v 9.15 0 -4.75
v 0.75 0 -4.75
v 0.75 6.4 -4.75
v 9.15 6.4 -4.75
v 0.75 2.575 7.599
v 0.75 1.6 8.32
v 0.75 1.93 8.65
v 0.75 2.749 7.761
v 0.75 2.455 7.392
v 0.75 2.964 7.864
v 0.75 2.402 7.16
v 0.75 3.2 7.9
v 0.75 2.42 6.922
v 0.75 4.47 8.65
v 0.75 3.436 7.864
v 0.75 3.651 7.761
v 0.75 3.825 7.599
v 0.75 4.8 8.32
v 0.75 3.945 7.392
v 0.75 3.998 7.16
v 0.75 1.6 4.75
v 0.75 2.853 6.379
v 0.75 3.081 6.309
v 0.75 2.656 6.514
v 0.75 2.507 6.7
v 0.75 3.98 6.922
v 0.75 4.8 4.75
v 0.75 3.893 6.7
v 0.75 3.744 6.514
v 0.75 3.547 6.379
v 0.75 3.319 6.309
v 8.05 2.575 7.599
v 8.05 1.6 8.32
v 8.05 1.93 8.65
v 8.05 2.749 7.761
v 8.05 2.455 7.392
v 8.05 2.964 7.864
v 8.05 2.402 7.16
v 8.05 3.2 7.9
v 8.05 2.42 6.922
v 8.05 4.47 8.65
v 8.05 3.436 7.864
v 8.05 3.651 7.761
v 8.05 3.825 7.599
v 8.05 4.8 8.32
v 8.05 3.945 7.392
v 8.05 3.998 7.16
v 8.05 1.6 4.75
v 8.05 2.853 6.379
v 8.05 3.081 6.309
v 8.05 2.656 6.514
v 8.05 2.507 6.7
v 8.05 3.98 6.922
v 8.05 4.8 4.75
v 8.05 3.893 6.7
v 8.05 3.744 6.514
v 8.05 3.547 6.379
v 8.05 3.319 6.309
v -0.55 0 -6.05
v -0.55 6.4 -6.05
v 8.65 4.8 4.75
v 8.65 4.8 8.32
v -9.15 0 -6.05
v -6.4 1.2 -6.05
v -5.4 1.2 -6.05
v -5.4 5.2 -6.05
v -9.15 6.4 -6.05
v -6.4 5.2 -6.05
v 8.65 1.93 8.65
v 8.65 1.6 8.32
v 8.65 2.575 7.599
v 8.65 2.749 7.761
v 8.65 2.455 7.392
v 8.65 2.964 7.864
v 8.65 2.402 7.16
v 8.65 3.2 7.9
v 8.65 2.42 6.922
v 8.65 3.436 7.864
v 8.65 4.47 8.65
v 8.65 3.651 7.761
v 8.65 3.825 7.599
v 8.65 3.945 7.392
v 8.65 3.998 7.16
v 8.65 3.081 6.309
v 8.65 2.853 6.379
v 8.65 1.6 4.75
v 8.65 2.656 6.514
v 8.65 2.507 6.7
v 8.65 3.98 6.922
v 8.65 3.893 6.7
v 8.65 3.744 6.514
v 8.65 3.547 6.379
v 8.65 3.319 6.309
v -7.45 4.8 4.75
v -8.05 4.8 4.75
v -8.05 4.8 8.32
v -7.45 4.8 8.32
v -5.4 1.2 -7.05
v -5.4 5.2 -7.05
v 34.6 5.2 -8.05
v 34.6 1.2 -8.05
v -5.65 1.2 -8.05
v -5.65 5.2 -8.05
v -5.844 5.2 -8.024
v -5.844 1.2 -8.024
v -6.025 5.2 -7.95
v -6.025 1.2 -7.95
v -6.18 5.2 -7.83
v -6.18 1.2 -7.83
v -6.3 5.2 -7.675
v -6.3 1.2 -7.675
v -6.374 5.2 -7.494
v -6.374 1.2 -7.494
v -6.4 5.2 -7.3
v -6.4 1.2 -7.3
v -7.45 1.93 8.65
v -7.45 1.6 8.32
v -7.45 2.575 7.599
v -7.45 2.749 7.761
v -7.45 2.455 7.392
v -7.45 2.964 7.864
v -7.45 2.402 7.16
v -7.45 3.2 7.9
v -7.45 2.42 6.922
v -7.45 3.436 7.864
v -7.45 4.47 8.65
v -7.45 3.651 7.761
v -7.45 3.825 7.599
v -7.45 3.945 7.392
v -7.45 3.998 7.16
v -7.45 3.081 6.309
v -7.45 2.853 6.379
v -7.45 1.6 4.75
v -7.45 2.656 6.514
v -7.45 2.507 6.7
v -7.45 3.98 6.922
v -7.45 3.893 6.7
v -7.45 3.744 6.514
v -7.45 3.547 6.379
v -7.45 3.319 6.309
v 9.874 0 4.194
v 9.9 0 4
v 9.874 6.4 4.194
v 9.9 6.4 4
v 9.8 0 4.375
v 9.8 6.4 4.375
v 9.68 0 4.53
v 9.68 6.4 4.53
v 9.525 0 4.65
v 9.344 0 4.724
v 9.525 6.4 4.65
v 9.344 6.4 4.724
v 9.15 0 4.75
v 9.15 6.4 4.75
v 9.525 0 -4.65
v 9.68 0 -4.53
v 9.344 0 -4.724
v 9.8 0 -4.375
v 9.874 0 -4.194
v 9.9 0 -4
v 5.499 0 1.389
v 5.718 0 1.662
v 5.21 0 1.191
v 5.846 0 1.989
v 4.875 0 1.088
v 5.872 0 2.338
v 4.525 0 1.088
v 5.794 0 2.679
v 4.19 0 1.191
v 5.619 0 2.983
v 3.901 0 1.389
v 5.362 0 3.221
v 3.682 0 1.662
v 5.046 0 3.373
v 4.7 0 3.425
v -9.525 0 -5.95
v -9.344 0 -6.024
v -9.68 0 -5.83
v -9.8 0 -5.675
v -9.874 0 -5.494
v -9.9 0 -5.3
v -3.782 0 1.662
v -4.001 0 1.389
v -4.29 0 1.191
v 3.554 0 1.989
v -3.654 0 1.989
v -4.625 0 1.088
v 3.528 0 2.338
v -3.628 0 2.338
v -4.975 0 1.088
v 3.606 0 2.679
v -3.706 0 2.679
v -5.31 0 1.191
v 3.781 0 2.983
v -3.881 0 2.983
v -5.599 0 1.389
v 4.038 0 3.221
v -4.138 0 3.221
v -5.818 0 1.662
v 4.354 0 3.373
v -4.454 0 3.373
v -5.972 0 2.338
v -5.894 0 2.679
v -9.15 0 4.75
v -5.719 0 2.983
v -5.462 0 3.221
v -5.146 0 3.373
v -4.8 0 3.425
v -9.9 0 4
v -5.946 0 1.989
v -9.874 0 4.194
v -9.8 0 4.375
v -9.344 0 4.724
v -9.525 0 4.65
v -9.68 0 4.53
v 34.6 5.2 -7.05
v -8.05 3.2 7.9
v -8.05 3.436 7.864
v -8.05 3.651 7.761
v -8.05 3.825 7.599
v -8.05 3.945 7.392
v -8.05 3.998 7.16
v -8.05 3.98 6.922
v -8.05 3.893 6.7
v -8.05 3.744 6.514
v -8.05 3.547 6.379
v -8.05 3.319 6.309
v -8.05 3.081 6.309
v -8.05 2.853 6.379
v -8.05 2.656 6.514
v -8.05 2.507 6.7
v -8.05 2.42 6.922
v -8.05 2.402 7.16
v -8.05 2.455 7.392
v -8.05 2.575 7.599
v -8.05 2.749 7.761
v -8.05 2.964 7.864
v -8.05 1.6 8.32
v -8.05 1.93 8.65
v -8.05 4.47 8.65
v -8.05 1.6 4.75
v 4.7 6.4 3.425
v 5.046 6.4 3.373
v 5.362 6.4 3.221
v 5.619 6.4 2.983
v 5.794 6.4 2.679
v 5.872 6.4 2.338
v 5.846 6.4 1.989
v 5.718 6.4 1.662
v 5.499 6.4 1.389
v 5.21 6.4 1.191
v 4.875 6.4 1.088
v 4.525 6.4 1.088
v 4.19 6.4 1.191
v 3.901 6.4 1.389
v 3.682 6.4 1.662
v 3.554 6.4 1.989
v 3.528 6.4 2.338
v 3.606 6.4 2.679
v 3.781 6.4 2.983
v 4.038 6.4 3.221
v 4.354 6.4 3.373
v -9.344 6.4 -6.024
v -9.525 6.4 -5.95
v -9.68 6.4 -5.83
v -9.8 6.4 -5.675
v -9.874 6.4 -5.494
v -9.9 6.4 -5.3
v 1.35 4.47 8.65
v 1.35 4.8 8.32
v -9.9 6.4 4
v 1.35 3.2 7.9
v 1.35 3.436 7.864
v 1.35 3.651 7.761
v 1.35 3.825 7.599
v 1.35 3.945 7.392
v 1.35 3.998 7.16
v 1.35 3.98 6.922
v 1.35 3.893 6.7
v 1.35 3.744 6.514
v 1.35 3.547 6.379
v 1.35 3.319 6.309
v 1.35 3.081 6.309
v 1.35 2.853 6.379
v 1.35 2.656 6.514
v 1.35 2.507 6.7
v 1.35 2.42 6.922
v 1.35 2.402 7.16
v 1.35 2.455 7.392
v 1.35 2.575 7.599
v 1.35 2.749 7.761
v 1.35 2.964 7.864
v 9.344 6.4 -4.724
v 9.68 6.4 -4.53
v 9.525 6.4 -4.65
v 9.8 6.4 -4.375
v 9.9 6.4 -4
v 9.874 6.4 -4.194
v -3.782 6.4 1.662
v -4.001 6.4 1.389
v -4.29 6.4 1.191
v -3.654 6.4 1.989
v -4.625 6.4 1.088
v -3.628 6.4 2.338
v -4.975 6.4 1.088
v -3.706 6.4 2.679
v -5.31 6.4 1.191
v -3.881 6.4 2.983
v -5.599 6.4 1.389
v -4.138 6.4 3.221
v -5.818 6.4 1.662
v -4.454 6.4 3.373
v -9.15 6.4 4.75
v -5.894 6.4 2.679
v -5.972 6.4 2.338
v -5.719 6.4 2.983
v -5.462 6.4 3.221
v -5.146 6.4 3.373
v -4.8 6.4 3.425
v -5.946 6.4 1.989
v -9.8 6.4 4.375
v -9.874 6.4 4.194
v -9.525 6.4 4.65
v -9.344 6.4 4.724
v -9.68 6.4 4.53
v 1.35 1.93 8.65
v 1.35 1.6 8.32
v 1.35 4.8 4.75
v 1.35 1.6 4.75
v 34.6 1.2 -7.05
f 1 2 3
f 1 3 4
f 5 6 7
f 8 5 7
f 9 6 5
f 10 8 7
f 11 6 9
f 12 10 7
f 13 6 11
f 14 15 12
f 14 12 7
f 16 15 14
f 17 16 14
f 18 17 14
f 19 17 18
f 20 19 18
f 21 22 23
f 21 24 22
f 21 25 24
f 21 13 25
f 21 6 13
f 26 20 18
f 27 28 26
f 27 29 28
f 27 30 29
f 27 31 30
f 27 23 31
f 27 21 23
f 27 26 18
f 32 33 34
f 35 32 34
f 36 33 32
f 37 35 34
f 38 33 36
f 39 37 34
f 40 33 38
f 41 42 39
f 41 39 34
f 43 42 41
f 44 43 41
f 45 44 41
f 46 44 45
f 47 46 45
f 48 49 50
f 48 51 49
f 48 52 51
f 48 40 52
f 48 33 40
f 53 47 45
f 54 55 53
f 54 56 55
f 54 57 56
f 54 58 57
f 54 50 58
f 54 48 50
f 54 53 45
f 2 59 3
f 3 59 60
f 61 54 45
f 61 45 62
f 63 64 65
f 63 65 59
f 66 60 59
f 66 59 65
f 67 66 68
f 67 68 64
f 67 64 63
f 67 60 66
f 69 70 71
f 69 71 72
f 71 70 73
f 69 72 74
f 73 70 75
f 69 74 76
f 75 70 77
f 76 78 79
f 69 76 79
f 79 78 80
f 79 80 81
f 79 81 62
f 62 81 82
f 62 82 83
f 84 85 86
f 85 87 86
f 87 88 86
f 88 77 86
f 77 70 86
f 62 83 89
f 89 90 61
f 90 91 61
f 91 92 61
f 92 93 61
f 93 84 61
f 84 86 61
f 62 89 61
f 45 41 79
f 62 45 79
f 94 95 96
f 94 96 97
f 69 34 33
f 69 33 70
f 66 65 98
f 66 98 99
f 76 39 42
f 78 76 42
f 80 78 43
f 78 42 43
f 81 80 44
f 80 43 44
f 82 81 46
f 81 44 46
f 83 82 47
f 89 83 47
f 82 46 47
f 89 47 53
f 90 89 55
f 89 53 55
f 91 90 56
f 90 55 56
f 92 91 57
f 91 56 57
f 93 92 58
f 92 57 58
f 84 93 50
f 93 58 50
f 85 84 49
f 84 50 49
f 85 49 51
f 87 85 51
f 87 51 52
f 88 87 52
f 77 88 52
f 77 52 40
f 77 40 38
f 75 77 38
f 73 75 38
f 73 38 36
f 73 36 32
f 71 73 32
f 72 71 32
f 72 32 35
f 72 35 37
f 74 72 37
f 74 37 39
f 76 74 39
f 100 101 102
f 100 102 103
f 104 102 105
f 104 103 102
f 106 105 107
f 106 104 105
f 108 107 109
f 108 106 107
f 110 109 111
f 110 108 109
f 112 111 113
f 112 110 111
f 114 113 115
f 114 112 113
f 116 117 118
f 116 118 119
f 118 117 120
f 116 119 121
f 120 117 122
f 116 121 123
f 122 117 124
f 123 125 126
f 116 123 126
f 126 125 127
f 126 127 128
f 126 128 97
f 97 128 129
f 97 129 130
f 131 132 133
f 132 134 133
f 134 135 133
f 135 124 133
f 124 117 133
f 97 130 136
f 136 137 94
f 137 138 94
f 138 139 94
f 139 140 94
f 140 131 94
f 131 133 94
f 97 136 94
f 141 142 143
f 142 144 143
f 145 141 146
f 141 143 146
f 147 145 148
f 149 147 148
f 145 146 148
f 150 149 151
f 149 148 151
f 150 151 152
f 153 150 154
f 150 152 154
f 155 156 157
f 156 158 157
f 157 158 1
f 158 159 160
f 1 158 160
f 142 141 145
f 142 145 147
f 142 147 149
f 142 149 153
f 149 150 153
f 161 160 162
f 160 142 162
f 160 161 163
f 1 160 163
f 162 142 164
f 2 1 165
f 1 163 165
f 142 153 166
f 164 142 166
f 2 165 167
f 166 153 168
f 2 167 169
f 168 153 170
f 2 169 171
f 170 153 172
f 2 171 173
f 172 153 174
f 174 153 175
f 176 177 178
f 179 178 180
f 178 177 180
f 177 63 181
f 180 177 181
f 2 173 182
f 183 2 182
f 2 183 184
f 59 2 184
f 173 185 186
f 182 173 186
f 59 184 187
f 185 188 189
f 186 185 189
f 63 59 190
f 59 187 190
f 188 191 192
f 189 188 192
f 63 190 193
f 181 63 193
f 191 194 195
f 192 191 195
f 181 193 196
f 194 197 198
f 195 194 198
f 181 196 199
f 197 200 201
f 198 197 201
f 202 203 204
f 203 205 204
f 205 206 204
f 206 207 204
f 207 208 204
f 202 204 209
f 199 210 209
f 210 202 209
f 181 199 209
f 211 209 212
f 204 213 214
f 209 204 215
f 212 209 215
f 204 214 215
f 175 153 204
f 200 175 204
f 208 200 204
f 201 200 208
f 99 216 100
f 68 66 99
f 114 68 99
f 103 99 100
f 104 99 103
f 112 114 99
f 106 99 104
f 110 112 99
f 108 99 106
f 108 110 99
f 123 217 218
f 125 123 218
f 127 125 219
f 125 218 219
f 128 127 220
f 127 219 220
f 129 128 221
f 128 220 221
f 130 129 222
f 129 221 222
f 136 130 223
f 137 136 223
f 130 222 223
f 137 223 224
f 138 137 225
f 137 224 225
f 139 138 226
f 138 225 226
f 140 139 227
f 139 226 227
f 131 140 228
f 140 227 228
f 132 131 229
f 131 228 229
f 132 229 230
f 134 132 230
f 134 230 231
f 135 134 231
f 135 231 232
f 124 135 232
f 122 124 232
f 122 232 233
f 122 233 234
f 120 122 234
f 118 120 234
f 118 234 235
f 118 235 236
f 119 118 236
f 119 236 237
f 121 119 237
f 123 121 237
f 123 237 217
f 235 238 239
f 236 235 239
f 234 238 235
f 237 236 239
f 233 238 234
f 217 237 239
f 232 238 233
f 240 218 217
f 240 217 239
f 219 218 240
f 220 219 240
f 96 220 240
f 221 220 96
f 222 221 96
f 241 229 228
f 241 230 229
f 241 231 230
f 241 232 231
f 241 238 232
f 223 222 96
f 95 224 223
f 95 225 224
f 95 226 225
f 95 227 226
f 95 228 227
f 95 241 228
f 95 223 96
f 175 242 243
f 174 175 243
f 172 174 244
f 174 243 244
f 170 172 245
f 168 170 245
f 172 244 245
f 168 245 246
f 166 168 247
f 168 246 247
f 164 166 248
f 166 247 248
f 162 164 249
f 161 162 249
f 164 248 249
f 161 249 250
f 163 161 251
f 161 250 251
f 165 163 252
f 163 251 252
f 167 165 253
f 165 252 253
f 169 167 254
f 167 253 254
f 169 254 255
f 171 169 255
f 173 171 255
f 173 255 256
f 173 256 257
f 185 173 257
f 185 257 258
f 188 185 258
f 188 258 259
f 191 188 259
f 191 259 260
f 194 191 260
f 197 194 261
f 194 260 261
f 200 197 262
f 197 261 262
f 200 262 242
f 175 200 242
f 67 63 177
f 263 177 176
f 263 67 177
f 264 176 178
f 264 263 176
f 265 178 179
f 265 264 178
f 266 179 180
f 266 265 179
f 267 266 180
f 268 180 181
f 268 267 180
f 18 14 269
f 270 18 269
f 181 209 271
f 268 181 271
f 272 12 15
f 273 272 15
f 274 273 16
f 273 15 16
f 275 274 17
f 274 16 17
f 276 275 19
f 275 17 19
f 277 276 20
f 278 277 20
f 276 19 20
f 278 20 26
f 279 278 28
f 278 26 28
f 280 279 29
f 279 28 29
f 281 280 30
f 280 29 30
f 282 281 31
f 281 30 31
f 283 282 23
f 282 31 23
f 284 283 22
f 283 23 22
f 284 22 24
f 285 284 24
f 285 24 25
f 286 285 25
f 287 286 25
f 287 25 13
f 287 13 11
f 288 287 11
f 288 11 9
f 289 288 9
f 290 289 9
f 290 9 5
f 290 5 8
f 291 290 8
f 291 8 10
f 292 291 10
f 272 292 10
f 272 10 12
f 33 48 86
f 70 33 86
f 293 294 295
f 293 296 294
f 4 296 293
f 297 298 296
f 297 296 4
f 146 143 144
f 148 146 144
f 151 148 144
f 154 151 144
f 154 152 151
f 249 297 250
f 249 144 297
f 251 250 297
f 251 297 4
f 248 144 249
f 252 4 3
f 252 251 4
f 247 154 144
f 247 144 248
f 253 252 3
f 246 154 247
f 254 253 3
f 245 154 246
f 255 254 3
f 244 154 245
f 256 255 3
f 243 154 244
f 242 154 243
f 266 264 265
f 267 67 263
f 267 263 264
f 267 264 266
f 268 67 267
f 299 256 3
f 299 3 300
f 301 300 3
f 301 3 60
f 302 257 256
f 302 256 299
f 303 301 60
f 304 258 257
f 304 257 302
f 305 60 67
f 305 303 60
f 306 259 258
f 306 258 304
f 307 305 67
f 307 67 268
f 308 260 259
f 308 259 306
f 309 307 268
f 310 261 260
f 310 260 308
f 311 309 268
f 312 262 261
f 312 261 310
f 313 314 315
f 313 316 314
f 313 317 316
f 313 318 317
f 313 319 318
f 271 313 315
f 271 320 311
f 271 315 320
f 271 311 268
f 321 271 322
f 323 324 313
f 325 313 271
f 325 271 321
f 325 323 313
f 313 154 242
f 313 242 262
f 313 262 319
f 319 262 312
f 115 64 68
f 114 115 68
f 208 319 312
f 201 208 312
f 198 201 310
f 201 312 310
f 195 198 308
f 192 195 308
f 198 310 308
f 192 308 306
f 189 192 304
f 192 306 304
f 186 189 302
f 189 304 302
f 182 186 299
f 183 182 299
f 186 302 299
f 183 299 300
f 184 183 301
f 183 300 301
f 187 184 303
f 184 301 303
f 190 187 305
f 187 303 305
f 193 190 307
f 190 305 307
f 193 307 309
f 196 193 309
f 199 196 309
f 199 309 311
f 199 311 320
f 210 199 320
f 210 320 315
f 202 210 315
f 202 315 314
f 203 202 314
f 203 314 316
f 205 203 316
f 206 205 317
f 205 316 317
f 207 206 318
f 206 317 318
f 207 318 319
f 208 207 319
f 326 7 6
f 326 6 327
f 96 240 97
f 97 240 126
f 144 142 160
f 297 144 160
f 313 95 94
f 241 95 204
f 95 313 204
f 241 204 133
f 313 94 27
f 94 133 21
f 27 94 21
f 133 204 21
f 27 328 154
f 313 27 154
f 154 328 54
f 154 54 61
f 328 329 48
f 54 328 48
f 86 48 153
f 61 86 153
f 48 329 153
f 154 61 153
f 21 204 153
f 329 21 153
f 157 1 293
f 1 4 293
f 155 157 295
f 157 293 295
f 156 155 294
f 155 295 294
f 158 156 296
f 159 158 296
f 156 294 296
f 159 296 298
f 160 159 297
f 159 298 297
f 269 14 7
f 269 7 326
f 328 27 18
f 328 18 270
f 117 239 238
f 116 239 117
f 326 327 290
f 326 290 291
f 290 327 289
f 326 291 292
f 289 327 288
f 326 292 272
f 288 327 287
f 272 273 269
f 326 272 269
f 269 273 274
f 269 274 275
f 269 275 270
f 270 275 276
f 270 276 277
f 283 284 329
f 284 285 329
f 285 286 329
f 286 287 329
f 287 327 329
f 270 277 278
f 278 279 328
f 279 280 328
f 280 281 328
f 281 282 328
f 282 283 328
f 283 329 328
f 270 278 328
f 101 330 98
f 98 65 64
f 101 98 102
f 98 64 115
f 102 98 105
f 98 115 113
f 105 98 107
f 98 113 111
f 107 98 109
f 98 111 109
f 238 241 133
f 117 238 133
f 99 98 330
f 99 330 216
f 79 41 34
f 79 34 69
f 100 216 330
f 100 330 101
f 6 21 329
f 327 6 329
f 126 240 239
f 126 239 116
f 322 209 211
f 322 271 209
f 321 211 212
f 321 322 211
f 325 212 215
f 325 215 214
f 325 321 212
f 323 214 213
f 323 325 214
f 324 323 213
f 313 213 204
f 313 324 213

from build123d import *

# Parameters (mm, degrees)
SKETCH1_W           = 19.8
SKETCH1_H           = 9.5
BOSS_EXTRUDE1_DEPTH = 6.4
SKETCH2_W           = 10.65
SKETCH2_H           = 6.4
BOSS_EXTRUDE2_DEPTH = 1.3
CHAMFER3_SIZE       = 1.3
FILLET1_R           = 0.75
SKETCH3_W           = 1
SKETCH3_H           = 4
BOSS_EXTRUDE3_DEPTH = 2
SKETCH4_W           = 1
SKETCH4_H           = 4
BOSS_EXTRUDE4_DEPTH = 40
FILLET2_R           = 0.75
SKETCH5_R           = 1.175
CUT_EXTRUDE1_DEPTH  = 6.4
SKETCH6_W           = 0.6
SKETCH6_H           = 3.2
BOSS_EXTRUDE5_DEPTH = 3.9
SKETCH8_R           = 0.8
CUT_EXTRUDE2_DEPTH  = 16.7
CHAMFER4_SIZE       = 0.33


with BuildPart() as part:
    # Sketch1 → Boss-Extrude1 (new body)
    with BuildSketch(Plane(origin=(0, 0, 0), x_dir=(1, 0, 0), z_dir=(0, 1, 0))):
        Rectangle(SKETCH1_W, SKETCH1_H)
    extrude(amount=BOSS_EXTRUDE1_DEPTH)

    # Sketch2 → Boss-Extrude2 (add)
    with BuildSketch(Plane(origin=(0, 0, -4.75), x_dir=(-1, 0, 0), z_dir=(0, 0, -1))):
        with Locations((4.575, 3.2)):
            Rectangle(SKETCH2_W, SKETCH2_H)
    extrude(amount=BOSS_EXTRUDE2_DEPTH)

    # Chamfer3
    chamfer3_edges = [part.edges().sort_by_distance(p)[0] for p in [
        (0.75, 3.2, -6.05),
    ]]
    chamfer(chamfer3_edges, length=CHAMFER3_SIZE - 0.0001)  # a hair under: the kernel refuses the full size

    # Fillet1
    fillet1_edges = [part.edges().sort_by_distance(p)[0] for p in [
        (-9.9, 3.2, -6.05),
        (9.9, 3.2, 4.75),
        (-9.9, 3.2, 4.75),
        (9.9, 3.2, -4.75),
    ]]
    fillet(fillet1_edges, radius=FILLET1_R)

    # Sketch3 → Boss-Extrude3 (add)
    with BuildSketch(Plane(origin=(0, 0, -6.05), x_dir=(-1, 0, 0), z_dir=(0, 0, -1))):
        with Locations((5.9, 3.2)):
            Rectangle(SKETCH3_W, SKETCH3_H)
    extrude(amount=BOSS_EXTRUDE3_DEPTH)

    # Sketch4 → Boss-Extrude4 (add)
    with BuildSketch(Plane(origin=(-5.4, 0, 0), x_dir=(0, 0, -1), z_dir=(1, 0, 0))):
        with Locations((7.55, 3.2)):
            Rectangle(SKETCH4_W, SKETCH4_H)
    extrude(amount=BOSS_EXTRUDE4_DEPTH)

    # Fillet2
    fillet2_edges = [part.edges().sort_by_distance(p)[0] for p in [
        (-6.4, 3.2, -8.05),
    ]]
    fillet(fillet2_edges, radius=FILLET2_R)

    # Sketch5 → Cut-Extrude1 (cut)
    with BuildSketch(Plane(origin=(0, 6.4, 0), x_dir=(1, 0, 0), z_dir=(0, 1, 0))):
        with Locations(Location((-4.8, -2.25, 0), (0, 0, 270))):
            Circle(SKETCH5_R)
        with Locations(Location((4.7, -2.25, 0), (0, 0, 270))):
            Circle(SKETCH5_R)
    extrude(amount=-CUT_EXTRUDE1_DEPTH, mode=Mode.SUBTRACT)

    # Sketch6 → Boss-Extrude5 (add)
    with BuildSketch(Plane.XY.offset(4.75)):
        with Locations((-7.75, 3.2)):
            Rectangle(SKETCH6_W, SKETCH6_H)
        with Locations((1.05, 3.2)):
            Rectangle(SKETCH6_W, SKETCH6_H)
        with Locations((8.35, 3.2)):
            Rectangle(SKETCH6_W, SKETCH6_H)
    extrude(amount=BOSS_EXTRUDE5_DEPTH)

    # Sketch8 → Cut-Extrude2 (cut)
    with BuildSketch(Plane.ZY.offset(8.05)):
        with Locations((7.1, 3.2)):
            Circle(SKETCH8_R)
    extrude(amount=-CUT_EXTRUDE2_DEPTH, mode=Mode.SUBTRACT)

    # Chamfer4
    chamfer4_edges = [part.edges().sort_by_distance(p)[0] for p in [
        (-7.75, 1.6, 8.65),
        (-7.75, 4.8, 8.65),
        (1.05, 1.6, 8.65),
        (1.05, 4.8, 8.65),
        (8.35, 1.6, 8.65),
        (8.35, 4.8, 8.65),
    ]]
    chamfer(chamfer4_edges, length=CHAMFER4_SIZE)


solid = part.part
